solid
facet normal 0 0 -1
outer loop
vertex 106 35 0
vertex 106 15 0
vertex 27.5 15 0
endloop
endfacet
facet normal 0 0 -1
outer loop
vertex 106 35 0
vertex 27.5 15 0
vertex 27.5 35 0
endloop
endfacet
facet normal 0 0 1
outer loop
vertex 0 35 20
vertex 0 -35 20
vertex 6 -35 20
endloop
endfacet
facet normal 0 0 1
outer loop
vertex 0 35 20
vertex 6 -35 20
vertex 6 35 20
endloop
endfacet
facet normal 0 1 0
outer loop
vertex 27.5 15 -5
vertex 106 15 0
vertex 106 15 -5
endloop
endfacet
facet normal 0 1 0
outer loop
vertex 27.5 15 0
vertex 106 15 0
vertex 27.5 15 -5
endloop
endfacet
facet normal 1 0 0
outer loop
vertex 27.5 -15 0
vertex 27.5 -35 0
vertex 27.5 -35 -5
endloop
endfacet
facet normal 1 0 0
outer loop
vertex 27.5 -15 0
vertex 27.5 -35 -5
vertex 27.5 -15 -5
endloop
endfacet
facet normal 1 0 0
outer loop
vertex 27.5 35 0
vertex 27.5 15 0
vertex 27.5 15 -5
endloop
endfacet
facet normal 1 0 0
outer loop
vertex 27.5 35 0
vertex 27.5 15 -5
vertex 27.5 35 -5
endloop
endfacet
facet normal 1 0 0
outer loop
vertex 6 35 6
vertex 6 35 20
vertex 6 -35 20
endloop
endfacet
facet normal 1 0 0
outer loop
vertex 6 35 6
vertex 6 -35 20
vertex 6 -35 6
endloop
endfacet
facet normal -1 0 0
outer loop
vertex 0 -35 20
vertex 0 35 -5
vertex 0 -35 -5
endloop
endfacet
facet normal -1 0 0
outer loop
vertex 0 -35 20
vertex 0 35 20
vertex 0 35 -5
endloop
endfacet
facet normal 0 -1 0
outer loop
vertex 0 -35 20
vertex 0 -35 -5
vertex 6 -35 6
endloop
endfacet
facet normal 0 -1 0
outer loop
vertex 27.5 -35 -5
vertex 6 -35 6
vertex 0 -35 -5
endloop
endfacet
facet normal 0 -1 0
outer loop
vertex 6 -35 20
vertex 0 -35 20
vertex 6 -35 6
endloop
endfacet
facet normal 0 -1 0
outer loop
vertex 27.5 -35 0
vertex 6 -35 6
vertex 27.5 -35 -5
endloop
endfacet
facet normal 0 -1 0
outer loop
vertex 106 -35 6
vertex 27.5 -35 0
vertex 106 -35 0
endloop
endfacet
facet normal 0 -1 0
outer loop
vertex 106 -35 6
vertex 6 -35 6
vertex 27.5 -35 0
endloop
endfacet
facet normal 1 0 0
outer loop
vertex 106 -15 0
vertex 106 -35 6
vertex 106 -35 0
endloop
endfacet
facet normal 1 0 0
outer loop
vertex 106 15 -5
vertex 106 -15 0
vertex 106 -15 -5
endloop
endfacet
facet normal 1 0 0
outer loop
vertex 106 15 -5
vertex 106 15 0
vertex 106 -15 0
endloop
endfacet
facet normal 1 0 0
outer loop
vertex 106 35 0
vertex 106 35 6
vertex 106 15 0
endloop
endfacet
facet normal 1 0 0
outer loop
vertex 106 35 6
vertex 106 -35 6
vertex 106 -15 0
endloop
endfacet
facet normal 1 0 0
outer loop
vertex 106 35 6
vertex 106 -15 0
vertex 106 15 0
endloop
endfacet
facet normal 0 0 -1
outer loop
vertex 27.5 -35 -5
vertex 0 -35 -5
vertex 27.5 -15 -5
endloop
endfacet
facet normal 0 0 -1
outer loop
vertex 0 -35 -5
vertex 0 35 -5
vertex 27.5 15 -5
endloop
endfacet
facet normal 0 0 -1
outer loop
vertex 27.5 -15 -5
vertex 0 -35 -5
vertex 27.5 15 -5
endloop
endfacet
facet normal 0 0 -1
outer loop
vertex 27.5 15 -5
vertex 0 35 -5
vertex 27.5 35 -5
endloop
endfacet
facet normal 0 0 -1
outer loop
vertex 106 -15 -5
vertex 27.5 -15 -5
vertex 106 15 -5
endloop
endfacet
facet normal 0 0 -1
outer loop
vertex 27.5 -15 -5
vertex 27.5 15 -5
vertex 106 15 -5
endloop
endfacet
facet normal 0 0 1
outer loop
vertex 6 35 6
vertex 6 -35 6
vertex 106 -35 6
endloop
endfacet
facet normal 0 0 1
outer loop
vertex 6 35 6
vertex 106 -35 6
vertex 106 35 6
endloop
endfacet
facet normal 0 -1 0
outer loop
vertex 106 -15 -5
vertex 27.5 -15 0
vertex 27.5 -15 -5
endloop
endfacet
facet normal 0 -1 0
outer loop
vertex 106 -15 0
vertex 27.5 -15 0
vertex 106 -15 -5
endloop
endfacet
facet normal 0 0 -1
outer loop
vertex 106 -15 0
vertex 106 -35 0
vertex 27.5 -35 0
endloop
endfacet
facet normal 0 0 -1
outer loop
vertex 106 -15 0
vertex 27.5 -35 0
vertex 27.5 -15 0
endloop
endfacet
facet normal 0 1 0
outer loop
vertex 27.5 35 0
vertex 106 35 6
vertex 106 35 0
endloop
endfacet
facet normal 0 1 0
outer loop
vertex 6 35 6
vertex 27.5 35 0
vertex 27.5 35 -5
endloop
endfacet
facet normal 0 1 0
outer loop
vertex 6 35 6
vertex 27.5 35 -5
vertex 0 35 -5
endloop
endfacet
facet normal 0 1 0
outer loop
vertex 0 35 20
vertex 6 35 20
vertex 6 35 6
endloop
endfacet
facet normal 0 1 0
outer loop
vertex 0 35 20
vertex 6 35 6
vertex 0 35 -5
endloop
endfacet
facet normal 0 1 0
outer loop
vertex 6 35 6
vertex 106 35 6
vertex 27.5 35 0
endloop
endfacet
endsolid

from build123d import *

# Parameters (mm, degrees)
SKETCH_1_W      = 20
SKETCH_1_H      = 70
EXTRUDE_1_DEPTH = 6
SKETCH_2_W      = 6
SKETCH_2_H      = 70
EXTRUDE_2_DEPTH = 100
EXTRUDE_3_DEPTH = 5


with BuildPart() as part:
    # 草图1 → 凸台-拉伸1 (new body)
    with BuildSketch(Plane(origin=(0, 0, 0), x_dir=(0, 0, -1), z_dir=(1, 0, 0))):
        with Locations((-10, 0)):
            Rectangle(SKETCH_1_W, SKETCH_1_H)
    extrude(amount=EXTRUDE_1_DEPTH)

    # 草图2 → 凸台-拉伸2 (add)
    with BuildSketch(Plane(origin=(6, 0, 0), x_dir=(0, 0, -1), z_dir=(1, 0, 0))):
        with Locations((-3, 0)):
            Rectangle(SKETCH_2_W, SKETCH_2_H)
    extrude(amount=EXTRUDE_2_DEPTH)

    # 草图3 → 凸台-拉伸3 (add)
    with BuildSketch(Plane(origin=(0, 0, 0), x_dir=(-1, 0, 0), z_dir=(0, 0, -1))):
        Polygon((0, -35), (-27.5, -35), (-27.5, -15), (-106, -15), (-106, 15), (-27.5, 15), (-27.5, 35), (0, 35), align=None)
    extrude(amount=EXTRUDE_3_DEPTH)


solid = part.part
